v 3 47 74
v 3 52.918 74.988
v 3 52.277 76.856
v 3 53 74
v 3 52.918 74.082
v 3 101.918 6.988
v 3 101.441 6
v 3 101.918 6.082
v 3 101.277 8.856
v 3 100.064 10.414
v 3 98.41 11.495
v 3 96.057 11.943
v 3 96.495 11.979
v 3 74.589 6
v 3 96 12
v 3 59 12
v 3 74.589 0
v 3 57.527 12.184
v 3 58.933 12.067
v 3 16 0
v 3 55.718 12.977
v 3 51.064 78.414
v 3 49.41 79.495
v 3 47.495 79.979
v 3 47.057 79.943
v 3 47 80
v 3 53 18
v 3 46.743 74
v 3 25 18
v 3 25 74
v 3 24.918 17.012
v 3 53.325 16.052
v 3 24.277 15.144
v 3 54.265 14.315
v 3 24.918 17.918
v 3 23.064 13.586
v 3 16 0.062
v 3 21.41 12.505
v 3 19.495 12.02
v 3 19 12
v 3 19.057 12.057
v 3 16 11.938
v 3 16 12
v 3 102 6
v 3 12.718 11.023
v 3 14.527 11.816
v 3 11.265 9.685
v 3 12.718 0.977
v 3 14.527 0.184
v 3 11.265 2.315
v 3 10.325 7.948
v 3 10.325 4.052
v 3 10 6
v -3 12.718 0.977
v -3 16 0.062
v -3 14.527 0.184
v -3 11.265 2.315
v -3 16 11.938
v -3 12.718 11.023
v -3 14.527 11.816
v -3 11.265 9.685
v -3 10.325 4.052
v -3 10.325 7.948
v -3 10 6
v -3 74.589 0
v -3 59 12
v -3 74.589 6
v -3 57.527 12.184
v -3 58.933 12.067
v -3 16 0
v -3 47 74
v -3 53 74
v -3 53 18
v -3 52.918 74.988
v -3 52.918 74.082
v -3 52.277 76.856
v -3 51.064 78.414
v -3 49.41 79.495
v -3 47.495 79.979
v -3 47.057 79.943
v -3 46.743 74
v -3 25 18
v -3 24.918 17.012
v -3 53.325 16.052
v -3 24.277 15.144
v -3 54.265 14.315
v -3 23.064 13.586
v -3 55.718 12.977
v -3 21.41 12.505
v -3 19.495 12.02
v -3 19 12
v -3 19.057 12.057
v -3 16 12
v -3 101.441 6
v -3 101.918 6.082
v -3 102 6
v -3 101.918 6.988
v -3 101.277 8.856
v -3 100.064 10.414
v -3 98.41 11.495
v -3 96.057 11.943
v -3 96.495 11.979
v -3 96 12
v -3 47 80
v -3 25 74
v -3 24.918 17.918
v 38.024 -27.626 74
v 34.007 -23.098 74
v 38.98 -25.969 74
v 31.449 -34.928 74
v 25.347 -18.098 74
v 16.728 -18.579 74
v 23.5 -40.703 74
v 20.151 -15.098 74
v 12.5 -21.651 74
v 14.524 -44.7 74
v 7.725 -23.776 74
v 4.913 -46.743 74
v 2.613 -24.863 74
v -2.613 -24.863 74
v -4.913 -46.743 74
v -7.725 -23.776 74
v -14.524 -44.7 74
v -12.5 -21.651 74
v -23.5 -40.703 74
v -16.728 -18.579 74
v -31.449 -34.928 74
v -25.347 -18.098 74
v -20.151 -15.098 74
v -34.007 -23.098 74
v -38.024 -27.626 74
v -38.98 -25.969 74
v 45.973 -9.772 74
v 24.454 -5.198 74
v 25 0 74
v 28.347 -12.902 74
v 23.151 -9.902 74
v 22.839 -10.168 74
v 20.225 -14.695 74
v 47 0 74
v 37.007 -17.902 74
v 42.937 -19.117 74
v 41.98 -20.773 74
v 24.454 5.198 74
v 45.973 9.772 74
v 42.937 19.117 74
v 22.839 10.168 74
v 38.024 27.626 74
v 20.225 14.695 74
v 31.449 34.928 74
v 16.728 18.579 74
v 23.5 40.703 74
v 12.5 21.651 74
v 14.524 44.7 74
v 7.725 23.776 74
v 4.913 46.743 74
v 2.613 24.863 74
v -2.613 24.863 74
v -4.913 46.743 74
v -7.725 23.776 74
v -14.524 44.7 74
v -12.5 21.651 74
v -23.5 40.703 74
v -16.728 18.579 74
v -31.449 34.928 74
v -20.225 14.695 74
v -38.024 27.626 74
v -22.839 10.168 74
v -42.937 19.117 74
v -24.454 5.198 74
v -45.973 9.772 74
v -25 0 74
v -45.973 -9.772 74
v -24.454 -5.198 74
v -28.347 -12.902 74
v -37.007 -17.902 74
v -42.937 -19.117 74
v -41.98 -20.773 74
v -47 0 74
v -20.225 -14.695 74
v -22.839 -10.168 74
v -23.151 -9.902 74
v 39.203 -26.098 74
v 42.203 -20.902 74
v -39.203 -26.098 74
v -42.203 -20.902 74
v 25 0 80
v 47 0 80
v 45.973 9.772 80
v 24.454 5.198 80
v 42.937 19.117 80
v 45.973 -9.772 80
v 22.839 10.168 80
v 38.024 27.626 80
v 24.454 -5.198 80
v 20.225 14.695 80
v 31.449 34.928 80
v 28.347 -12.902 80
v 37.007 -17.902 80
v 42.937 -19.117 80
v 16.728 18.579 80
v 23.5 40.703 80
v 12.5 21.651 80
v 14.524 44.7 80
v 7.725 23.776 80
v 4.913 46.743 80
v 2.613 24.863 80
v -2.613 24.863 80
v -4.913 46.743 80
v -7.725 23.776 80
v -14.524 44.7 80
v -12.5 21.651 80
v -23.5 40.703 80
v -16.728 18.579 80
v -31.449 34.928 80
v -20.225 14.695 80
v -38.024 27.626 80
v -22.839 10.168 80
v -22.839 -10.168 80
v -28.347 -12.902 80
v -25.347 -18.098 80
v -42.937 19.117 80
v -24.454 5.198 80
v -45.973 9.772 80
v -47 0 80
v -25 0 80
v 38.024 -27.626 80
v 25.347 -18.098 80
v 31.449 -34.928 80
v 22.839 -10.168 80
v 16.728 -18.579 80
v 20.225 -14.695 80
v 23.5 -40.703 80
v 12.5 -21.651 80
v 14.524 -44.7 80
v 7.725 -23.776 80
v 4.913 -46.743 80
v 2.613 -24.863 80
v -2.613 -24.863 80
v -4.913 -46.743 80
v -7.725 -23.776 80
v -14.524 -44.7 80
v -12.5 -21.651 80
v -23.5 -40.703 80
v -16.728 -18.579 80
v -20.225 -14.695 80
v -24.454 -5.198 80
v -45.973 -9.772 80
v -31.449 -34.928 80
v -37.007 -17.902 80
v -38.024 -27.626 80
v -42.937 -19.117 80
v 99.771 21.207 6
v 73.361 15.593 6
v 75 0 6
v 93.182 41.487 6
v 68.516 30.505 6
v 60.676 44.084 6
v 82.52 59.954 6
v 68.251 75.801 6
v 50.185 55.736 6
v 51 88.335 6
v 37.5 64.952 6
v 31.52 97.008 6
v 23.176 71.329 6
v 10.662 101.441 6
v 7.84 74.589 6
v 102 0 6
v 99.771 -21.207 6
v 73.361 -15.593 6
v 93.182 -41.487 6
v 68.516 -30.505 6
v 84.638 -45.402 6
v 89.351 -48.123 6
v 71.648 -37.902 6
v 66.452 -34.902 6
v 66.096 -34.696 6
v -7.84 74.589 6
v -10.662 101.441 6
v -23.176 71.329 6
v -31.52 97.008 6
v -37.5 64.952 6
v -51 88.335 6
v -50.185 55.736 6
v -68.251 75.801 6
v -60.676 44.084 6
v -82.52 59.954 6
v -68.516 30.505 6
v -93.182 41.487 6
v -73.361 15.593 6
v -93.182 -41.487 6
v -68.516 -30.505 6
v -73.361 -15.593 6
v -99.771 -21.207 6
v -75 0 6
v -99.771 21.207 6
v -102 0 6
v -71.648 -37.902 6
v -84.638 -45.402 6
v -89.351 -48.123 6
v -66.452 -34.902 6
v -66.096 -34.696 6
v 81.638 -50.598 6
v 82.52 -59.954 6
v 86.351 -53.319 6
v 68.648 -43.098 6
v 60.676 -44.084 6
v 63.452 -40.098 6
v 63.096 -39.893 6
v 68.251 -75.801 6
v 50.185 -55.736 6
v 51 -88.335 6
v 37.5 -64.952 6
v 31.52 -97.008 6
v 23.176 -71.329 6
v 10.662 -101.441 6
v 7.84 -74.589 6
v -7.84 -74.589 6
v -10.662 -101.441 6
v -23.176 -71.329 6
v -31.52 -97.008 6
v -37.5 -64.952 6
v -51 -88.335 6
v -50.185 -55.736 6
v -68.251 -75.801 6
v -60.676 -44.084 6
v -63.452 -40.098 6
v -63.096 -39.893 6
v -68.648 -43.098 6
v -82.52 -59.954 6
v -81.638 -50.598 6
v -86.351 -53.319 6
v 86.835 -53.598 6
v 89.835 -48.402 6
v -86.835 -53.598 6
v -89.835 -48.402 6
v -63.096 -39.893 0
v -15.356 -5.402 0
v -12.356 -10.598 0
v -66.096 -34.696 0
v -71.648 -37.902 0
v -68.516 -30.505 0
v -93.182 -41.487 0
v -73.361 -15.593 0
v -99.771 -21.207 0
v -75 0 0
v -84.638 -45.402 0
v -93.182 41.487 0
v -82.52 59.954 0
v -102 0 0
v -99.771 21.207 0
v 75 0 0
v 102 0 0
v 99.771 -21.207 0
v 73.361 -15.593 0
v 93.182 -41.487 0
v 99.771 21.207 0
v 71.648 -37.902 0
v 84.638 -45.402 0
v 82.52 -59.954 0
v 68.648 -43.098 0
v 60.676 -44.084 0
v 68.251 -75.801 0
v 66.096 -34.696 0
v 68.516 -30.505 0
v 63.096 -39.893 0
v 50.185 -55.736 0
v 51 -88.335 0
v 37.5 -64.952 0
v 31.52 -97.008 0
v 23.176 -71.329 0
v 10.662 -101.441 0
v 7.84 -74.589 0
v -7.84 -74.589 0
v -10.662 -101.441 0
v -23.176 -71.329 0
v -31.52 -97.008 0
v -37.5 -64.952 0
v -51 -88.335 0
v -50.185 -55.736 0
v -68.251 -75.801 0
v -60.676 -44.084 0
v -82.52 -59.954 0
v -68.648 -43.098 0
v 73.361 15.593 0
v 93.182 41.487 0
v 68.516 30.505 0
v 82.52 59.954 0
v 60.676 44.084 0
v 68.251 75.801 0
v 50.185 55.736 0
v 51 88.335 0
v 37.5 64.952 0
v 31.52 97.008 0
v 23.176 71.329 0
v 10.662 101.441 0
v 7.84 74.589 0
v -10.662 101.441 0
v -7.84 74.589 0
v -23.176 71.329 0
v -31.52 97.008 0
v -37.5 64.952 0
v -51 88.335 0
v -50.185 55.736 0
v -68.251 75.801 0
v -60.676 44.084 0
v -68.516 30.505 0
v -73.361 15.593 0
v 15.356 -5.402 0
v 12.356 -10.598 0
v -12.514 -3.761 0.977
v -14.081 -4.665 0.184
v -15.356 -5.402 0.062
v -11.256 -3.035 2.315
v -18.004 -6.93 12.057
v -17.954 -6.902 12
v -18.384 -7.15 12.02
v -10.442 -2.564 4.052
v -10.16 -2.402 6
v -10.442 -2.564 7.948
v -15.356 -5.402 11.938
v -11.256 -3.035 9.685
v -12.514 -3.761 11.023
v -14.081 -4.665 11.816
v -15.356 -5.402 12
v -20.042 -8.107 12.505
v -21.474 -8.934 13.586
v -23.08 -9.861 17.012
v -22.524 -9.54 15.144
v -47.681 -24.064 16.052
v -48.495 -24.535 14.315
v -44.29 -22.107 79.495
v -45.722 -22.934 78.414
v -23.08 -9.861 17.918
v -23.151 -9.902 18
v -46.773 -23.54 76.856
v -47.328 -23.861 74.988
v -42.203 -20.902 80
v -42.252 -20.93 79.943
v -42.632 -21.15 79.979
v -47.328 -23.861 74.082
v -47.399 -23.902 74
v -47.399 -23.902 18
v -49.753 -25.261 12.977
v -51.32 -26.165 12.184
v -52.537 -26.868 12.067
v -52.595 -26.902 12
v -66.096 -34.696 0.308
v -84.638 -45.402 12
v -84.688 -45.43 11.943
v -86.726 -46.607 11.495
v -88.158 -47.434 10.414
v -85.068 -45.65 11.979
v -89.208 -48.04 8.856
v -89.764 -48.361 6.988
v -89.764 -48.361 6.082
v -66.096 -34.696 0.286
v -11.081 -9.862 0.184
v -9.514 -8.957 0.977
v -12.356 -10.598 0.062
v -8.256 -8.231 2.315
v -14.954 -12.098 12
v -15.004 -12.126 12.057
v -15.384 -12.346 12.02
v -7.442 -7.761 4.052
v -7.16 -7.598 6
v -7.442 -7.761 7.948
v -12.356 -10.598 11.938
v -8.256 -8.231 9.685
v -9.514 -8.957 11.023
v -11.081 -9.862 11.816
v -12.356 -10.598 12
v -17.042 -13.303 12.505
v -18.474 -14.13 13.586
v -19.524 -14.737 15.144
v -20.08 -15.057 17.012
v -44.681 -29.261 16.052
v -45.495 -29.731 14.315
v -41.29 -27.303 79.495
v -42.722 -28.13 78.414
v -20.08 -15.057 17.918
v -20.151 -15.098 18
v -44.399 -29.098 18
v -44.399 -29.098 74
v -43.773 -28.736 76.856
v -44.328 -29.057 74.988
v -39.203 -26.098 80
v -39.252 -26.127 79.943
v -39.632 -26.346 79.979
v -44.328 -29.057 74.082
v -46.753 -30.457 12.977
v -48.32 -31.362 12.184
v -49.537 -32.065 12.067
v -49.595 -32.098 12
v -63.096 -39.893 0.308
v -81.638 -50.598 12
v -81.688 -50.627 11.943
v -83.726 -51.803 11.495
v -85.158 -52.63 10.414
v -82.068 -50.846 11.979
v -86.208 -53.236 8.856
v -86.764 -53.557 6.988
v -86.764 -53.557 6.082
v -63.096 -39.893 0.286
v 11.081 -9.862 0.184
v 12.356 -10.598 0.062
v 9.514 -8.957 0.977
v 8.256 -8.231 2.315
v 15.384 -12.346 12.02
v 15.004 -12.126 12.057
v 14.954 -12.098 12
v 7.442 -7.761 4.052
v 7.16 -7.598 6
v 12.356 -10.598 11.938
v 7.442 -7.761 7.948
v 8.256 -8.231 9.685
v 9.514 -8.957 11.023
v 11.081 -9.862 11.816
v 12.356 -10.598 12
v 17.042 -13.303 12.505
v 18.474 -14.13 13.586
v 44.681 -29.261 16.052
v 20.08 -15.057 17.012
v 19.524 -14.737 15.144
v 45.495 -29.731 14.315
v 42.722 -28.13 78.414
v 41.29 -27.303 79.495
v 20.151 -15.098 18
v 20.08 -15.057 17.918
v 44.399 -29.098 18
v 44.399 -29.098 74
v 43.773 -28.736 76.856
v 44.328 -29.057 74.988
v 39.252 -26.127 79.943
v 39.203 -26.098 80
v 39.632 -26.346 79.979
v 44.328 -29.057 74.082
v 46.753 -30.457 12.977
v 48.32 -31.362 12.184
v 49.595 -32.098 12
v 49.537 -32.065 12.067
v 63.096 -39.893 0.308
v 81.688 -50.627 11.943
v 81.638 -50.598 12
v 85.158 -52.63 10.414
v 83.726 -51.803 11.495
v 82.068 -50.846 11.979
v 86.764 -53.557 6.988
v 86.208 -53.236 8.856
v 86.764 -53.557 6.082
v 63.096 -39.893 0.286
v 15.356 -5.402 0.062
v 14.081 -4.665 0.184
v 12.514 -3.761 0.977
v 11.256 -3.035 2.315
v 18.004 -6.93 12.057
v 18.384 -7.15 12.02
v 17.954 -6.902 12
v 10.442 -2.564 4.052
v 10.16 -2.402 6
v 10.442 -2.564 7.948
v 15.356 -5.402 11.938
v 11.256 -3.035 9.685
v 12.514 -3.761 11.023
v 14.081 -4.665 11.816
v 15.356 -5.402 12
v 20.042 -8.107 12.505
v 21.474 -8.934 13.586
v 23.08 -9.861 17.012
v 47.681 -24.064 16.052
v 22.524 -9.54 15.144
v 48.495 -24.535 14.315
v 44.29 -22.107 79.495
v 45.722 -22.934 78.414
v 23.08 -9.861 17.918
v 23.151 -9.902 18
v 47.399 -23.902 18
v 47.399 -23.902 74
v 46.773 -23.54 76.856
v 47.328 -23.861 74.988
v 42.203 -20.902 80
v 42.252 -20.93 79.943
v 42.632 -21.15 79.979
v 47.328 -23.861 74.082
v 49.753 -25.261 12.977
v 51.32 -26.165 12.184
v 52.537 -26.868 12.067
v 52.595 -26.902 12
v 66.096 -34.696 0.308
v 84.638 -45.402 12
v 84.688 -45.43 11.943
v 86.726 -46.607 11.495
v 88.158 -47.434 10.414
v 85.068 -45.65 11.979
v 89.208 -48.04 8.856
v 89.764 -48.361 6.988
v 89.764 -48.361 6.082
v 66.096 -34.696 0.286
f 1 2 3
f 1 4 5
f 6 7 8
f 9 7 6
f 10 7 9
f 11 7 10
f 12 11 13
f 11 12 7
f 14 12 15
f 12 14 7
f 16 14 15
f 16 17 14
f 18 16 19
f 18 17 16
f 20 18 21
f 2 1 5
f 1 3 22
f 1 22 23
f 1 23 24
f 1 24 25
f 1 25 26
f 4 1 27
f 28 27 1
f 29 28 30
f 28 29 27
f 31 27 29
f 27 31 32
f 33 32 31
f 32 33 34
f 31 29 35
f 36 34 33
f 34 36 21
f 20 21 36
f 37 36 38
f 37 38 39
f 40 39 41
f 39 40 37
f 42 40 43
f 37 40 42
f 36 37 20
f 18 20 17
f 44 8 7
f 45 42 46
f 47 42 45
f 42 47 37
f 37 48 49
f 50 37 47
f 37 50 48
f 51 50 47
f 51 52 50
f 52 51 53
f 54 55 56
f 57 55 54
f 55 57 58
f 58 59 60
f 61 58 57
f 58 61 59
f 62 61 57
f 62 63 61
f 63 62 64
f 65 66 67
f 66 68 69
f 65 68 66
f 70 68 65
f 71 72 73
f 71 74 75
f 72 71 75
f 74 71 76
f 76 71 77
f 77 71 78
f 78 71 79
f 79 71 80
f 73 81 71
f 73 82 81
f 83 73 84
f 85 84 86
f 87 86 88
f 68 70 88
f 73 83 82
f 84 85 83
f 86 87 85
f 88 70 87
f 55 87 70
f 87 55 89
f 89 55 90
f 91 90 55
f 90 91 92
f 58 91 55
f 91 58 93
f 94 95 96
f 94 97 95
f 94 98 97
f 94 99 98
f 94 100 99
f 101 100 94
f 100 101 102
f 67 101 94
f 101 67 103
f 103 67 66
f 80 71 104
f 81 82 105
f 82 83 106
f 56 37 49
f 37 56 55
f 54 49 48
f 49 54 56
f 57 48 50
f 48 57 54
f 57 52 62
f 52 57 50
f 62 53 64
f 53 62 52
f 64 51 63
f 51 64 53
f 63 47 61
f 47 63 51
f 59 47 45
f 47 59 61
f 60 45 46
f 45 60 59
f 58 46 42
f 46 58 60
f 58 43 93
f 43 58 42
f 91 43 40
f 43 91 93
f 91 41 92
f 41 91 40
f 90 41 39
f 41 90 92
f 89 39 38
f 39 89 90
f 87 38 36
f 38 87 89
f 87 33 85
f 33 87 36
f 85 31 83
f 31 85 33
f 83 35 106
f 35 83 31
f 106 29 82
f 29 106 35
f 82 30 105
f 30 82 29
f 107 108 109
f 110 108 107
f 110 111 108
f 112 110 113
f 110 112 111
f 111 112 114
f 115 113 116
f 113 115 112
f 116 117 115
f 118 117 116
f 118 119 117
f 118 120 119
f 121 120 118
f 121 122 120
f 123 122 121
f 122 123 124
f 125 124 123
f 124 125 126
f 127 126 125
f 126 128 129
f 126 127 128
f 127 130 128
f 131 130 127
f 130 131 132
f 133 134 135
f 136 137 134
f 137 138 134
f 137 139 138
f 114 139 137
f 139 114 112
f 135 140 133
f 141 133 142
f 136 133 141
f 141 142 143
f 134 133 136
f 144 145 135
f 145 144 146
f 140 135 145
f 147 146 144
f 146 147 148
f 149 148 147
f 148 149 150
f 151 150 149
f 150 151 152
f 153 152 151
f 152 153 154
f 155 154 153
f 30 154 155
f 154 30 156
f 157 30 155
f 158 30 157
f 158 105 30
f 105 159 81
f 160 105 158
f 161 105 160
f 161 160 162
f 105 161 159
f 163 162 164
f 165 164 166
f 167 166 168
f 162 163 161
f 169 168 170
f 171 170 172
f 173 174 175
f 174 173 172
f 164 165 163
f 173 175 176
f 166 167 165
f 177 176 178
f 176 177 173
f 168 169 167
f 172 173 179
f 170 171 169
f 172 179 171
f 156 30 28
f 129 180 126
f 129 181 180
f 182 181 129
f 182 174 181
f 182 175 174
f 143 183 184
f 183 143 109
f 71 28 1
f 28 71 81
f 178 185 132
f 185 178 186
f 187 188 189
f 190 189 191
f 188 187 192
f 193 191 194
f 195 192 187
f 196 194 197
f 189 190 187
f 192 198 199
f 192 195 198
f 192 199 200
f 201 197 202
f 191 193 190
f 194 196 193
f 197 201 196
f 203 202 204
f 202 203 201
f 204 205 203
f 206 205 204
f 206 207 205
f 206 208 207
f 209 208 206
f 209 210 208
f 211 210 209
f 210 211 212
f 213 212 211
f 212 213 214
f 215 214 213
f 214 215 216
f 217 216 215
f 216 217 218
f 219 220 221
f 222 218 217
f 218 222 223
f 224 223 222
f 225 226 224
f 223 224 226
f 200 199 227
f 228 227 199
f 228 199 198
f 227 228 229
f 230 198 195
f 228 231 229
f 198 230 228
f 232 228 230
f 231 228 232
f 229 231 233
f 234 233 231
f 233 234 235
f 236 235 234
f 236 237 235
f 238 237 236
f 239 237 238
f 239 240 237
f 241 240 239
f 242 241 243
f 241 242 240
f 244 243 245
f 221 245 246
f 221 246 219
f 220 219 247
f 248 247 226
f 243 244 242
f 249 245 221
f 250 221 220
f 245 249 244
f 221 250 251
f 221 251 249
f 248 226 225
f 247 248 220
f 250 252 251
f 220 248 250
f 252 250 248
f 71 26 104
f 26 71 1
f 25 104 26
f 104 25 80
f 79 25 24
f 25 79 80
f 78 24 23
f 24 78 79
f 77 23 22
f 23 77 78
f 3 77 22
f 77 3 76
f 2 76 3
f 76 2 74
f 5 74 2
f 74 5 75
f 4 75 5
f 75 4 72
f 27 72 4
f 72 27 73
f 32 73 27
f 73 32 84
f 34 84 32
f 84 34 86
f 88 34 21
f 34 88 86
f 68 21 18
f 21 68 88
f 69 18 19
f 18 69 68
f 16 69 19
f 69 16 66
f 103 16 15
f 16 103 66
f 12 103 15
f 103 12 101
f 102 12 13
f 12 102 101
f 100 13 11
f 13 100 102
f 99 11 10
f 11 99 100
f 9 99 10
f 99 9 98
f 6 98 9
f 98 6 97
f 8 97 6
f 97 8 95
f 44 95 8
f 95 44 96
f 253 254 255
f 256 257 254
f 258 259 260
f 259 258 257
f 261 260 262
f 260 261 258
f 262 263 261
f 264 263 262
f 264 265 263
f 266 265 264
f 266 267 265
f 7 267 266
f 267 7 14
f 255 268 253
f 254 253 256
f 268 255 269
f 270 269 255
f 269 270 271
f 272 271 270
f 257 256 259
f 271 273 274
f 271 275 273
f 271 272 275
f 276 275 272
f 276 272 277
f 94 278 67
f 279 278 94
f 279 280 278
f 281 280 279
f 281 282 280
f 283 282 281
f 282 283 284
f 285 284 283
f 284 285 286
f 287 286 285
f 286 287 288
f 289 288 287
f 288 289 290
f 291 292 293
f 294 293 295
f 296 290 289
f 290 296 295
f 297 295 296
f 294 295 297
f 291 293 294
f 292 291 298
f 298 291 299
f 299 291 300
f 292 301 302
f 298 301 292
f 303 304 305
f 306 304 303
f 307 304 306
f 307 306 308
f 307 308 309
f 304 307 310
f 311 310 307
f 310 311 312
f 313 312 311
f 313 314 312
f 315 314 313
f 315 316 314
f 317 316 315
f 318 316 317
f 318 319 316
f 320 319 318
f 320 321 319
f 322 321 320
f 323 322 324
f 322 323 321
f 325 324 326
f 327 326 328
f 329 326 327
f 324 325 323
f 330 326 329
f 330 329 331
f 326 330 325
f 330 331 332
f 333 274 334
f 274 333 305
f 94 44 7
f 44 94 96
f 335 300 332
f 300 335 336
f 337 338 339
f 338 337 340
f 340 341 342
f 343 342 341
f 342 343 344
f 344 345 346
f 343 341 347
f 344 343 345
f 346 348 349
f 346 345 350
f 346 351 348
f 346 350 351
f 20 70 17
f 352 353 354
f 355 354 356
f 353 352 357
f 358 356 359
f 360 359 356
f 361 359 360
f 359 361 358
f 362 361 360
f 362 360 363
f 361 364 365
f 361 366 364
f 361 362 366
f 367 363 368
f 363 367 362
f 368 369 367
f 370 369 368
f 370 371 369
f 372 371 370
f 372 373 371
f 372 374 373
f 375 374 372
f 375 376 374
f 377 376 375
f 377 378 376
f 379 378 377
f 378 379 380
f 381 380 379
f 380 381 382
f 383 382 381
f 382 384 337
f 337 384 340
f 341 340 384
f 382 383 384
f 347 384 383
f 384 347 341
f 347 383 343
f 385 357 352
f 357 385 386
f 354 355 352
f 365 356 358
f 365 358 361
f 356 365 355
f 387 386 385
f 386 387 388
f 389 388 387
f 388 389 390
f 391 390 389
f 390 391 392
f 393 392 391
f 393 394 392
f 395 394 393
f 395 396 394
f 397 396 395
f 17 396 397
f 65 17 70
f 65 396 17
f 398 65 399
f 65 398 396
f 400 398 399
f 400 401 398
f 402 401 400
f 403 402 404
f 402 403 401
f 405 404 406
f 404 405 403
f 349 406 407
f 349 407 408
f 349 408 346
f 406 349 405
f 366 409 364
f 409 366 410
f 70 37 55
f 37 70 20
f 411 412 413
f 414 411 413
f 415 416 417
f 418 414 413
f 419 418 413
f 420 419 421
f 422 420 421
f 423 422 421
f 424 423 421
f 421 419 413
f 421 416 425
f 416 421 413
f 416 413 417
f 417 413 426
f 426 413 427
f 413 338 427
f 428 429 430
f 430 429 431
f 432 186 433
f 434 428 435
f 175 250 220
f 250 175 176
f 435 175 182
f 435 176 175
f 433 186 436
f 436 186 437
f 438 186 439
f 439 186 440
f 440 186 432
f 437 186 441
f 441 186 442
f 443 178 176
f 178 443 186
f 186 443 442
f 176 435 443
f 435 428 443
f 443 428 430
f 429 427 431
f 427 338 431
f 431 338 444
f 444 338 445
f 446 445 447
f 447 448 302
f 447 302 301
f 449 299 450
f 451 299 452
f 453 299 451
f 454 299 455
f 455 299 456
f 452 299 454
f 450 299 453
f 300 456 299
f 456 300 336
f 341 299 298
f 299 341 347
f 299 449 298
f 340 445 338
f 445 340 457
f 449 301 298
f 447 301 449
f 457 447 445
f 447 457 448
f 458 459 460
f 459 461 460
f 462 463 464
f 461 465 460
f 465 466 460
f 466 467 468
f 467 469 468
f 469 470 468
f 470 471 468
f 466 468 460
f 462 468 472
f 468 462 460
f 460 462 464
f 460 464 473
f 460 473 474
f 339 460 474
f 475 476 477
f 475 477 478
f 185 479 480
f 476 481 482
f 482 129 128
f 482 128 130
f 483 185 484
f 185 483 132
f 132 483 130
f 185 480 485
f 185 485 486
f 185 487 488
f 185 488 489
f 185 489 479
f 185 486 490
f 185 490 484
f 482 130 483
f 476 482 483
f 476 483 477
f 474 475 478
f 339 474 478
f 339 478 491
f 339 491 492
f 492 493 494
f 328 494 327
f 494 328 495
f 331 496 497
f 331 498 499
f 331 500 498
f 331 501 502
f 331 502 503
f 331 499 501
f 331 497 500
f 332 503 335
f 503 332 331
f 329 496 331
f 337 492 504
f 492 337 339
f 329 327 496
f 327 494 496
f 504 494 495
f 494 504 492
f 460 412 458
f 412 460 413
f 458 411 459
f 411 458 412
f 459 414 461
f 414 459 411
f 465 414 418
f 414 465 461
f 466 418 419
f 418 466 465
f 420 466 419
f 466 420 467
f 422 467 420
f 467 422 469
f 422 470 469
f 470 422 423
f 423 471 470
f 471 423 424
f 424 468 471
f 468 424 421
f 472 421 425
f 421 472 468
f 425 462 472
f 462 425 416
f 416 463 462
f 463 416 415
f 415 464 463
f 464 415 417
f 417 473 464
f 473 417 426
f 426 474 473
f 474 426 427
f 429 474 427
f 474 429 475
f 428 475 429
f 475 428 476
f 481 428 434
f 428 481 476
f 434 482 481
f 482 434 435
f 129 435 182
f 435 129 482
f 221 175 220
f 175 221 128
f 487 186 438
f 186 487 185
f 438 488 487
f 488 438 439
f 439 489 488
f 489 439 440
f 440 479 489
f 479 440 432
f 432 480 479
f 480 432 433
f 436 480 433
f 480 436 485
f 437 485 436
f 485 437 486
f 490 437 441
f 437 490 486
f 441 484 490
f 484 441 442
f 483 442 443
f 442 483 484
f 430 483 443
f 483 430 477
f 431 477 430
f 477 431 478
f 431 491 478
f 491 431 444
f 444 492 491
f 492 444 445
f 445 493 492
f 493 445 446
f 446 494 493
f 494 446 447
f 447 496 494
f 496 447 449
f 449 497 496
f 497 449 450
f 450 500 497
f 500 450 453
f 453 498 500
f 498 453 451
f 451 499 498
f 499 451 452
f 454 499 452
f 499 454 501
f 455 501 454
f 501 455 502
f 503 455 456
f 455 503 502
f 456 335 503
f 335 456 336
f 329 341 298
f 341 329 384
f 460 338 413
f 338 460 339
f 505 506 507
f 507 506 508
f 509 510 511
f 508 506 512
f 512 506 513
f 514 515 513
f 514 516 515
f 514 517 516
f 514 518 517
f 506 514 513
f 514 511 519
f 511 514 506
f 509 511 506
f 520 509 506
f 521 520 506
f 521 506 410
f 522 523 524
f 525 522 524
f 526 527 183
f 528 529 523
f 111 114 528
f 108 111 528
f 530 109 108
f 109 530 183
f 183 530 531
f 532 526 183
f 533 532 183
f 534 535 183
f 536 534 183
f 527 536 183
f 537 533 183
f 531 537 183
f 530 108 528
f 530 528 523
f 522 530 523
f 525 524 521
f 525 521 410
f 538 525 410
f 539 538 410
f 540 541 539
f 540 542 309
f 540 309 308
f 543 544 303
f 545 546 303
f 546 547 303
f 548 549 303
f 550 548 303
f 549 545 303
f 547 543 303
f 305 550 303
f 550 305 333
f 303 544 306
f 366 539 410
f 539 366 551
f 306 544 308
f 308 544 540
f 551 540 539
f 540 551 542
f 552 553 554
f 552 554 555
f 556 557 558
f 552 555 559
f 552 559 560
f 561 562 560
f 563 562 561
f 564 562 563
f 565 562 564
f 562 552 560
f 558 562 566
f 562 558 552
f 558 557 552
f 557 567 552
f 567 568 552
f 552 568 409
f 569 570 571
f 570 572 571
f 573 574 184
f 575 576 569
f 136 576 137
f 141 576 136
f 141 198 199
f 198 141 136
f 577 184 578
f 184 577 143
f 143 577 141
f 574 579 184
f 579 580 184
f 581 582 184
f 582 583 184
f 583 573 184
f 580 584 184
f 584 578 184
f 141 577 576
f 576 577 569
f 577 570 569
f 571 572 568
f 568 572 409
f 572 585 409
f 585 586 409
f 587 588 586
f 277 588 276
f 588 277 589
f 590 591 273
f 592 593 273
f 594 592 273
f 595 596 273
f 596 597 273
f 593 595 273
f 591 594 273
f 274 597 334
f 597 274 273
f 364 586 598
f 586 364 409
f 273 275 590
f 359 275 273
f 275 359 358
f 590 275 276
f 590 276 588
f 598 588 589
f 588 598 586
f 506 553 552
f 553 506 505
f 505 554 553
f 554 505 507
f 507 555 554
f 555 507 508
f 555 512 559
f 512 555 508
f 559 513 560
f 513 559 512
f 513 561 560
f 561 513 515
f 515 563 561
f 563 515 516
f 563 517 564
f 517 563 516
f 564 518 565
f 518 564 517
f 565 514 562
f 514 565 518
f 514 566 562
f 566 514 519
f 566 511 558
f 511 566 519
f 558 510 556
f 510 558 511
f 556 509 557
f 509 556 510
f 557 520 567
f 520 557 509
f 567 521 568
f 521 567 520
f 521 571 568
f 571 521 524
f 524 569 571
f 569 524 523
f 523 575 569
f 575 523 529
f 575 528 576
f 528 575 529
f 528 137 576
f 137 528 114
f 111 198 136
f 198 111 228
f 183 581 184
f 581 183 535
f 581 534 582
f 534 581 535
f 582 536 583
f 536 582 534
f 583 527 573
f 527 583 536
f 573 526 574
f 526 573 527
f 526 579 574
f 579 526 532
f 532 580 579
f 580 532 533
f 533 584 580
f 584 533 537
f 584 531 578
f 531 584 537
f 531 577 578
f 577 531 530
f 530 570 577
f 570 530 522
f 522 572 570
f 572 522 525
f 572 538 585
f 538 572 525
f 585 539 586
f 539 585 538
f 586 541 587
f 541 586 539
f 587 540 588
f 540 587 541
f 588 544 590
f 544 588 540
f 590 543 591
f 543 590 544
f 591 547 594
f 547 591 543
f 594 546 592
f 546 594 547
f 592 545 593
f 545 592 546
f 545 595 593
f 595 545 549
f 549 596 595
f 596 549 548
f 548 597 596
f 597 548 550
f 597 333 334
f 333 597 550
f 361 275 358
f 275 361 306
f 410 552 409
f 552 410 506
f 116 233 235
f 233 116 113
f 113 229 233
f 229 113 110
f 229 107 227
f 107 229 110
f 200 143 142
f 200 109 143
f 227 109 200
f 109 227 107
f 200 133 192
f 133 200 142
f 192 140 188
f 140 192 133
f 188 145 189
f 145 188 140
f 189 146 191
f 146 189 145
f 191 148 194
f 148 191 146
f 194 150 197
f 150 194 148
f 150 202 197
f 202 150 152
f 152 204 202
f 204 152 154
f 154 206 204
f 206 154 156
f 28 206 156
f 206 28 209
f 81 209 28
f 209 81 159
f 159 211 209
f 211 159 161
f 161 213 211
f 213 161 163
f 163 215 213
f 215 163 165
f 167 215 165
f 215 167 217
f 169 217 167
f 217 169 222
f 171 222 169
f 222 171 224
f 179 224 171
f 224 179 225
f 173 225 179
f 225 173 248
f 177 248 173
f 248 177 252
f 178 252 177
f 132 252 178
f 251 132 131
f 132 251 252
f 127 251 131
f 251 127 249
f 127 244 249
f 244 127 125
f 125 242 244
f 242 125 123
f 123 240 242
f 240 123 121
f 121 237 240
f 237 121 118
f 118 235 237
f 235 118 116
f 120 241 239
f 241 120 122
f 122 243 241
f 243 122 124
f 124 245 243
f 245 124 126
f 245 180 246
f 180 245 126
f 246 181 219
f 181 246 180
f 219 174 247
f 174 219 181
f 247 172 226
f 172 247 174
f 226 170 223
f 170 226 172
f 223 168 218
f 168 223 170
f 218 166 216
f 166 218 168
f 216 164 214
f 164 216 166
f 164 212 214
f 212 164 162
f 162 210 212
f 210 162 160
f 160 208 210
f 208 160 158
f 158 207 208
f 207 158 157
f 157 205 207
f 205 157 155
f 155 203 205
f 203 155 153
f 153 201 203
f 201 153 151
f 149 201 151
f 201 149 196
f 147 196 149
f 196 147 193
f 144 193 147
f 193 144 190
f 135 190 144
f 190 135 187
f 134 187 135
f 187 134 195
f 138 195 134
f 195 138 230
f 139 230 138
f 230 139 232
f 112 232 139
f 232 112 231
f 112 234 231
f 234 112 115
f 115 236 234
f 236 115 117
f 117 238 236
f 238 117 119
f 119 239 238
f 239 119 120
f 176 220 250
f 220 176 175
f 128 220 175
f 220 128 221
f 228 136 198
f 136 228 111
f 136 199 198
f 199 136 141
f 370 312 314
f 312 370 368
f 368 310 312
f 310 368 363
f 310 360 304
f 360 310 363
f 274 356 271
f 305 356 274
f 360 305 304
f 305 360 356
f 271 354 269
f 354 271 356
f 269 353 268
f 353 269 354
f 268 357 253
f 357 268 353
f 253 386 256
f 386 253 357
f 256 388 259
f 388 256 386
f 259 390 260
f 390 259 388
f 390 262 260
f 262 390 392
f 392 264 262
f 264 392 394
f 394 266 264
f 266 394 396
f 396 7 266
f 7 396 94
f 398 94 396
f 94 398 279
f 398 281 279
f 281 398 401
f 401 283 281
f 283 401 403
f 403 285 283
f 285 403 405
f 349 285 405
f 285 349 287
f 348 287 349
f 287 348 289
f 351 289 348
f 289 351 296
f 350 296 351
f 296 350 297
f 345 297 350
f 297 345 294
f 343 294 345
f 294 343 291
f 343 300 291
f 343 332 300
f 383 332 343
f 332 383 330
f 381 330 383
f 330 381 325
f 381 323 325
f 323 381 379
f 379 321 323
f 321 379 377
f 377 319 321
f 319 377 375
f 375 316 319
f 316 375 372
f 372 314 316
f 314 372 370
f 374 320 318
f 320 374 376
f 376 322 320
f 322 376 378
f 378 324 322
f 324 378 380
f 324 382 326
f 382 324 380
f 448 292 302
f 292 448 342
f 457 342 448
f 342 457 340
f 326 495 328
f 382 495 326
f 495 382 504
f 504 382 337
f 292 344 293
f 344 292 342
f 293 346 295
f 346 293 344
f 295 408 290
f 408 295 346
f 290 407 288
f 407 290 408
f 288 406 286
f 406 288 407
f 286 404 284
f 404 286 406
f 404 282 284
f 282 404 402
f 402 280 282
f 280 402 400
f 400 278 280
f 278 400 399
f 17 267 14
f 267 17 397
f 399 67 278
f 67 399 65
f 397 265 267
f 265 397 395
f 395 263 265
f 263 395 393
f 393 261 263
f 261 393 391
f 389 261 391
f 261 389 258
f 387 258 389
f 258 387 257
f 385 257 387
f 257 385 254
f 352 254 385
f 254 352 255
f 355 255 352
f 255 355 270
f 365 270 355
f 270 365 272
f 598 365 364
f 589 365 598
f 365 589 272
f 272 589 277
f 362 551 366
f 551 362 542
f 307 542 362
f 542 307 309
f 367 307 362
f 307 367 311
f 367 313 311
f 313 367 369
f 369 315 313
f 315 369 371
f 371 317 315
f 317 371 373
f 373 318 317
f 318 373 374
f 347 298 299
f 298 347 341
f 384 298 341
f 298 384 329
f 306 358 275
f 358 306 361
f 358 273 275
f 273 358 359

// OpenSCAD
mode = "assembled";

thickness = 6;
locklen1 = 15;
locklen2 = 10;
boltlen = 15;
midhole = 10;
inner1_to_inner2 = 50;
total_height = 80;

echo(version=version());

module shape_tripod()
{
	x1 = 0;
	x2 = x1 + thickness;
	x3 = x2 + locklen1;
	x4 = x3 + thickness;
	x5 = x4 + inner1_to_inner2;
	x6 = x5 - thickness;
	x7 = x6 - locklen2;
	x8 = x7 - thickness;
	x9 = x8 - thickness;
	x10 = x9 - thickness;
	
	y1 = 0;
	y2 = y1 + thickness;
	y3 = y2 + thickness;
	y4 = y3 + thickness;
	y5 = y3 + total_height - 3*thickness;
	y6 = y5 + thickness;
	
	union()
	{
		difference() {
			polygon([
				[ x1, y2 ], [ x2, y2 ],
				[ x2, y1 ], [ x3, y1 ], [ x3, y2 ],
				[ x4, y2 ], [ x4, y1 ], [ x5, y1 ],
				[ x5 + thickness, y3 ], [ x5, y4 ],
				[ x5, y5 ],
				[ x6, y5 ], [ x6, y6 ], [ x7, y6 ], [ x7, y5 ], [ x8, y5 ],
				[ x8, y6 ], [ x9, y5 ],
				[ x9, y4 ], [ x10, y3 ],
				[ x2, y3 ]
			]);
			translate([ x10, y4 ]) circle(thickness);
			translate([ x5 + thickness, y4 ]) circle(thickness);
		}
	
		translate([ x5, y1 ])
		square([ boltlen - thickness, thickness*2 ]);
	
		translate([ x5 + boltlen - thickness, y2 ]) circle(thickness);
	
		translate([ x2, y2 ]) intersection() {
			circle(thickness);
			translate([ -thickness*2, 0 ]) square(thickness*2);
		}
	
		translate([ x8, y5 ]) intersection() {
			circle(thickness);
			translate([ -thickness*2, 0 ]) square(thickness*2);
		}
	}
}

module shape_inner_disc()
{
	difference() {
		circle(midhole + boltlen + 2*thickness + locklen2);
		for (alpha = [ 0, 120, 240 ])
			rotate(alpha) translate([ 0, midhole + boltlen + thickness + locklen2/2 ]) square([ thickness, locklen2 ], true);
		circle(midhole + boltlen);
	}
}

module shape_outer_disc()
{
	difference() {
		circle(midhole + boltlen + inner1_to_inner2 + 2*thickness + locklen1);
		for (alpha = [ 0, 120, 240 ])
			rotate(alpha) translate([ 0, midhole + boltlen + inner1_to_inner2 + thickness + locklen1/2 ]) square([ thickness, locklen1 ], true);
		circle(midhole + boltlen + inner1_to_inner2);
	}
}

module parts()
{
	tripod_x_off = locklen1 - locklen2 + inner1_to_inner2;
	tripod_y_off = max(midhole + boltlen + inner1_to_inner2 + 4*thickness + locklen1, total_height);

	shape_inner_disc();
	shape_outer_disc();

	for (s = [ [1,1], [-1,1], [1,-1] ])
		scale(s) translate([ tripod_x_off, -tripod_y_off ]) shape_tripod();
}

module exploded()
{
	translate([ 0, 0, total_height + 2*thickness ]) linear_extrude(height = thickness, convexity = 4) shape_inner_disc();
	linear_extrude(height = thickness, convexity = 4) shape_outer_disc();

	color([ 0.7, 0.7, 1 ]) for (alpha = [ 0, 120, 240 ])
		rotate(alpha) translate([ 0, thickness*2 + locklen1 + inner1_to_inner2 + boltlen + midhole, 1.5*thickness ])
			rotate([ 90, 0, -90 ]) linear_extrude(height = thickness, convexity = 10, center = true) shape_tripod();
}

module bottle()
{
	r = boltlen + midhole;
	h = total_height - thickness*2;

	rotate_extrude(convexity = 2)
	{
		square([ r, h ]);

		translate([ 0, h ])
		intersection() {
			square([ r, r ]);
			scale([ 1, 0.7 ]) circle(r);
		}

		translate([ 0, h+r ])
		intersection() {
			translate([ 0, -r/2 ]) square([ r/2, r ]);
			circle(r/2);
		}
	}
}

module assembled()
{
	translate([ 0, 0, total_height - thickness ]) linear_extrude(height = thickness, convexity = 4) shape_inner_disc();
	linear_extrude(height = thickness, convexity = 4) shape_outer_disc();

	color([ 0.7, 0.7, 1 ]) for (alpha = [ 0, 120, 240 ])
		rotate(alpha) translate([ 0, thickness*2 + locklen1 + inner1_to_inner2 + boltlen + midhole, 0 ])
			rotate([ 90, 0, -90 ]) linear_extrude(height = thickness, convexity = 10, center = true) shape_tripod();

	% translate([ 0, 0, thickness*2]) bottle();
}

if (mode == "parts")
	parts();

if (mode == "exploded")
	exploded();

if (mode == "assembled")
	assembled();
